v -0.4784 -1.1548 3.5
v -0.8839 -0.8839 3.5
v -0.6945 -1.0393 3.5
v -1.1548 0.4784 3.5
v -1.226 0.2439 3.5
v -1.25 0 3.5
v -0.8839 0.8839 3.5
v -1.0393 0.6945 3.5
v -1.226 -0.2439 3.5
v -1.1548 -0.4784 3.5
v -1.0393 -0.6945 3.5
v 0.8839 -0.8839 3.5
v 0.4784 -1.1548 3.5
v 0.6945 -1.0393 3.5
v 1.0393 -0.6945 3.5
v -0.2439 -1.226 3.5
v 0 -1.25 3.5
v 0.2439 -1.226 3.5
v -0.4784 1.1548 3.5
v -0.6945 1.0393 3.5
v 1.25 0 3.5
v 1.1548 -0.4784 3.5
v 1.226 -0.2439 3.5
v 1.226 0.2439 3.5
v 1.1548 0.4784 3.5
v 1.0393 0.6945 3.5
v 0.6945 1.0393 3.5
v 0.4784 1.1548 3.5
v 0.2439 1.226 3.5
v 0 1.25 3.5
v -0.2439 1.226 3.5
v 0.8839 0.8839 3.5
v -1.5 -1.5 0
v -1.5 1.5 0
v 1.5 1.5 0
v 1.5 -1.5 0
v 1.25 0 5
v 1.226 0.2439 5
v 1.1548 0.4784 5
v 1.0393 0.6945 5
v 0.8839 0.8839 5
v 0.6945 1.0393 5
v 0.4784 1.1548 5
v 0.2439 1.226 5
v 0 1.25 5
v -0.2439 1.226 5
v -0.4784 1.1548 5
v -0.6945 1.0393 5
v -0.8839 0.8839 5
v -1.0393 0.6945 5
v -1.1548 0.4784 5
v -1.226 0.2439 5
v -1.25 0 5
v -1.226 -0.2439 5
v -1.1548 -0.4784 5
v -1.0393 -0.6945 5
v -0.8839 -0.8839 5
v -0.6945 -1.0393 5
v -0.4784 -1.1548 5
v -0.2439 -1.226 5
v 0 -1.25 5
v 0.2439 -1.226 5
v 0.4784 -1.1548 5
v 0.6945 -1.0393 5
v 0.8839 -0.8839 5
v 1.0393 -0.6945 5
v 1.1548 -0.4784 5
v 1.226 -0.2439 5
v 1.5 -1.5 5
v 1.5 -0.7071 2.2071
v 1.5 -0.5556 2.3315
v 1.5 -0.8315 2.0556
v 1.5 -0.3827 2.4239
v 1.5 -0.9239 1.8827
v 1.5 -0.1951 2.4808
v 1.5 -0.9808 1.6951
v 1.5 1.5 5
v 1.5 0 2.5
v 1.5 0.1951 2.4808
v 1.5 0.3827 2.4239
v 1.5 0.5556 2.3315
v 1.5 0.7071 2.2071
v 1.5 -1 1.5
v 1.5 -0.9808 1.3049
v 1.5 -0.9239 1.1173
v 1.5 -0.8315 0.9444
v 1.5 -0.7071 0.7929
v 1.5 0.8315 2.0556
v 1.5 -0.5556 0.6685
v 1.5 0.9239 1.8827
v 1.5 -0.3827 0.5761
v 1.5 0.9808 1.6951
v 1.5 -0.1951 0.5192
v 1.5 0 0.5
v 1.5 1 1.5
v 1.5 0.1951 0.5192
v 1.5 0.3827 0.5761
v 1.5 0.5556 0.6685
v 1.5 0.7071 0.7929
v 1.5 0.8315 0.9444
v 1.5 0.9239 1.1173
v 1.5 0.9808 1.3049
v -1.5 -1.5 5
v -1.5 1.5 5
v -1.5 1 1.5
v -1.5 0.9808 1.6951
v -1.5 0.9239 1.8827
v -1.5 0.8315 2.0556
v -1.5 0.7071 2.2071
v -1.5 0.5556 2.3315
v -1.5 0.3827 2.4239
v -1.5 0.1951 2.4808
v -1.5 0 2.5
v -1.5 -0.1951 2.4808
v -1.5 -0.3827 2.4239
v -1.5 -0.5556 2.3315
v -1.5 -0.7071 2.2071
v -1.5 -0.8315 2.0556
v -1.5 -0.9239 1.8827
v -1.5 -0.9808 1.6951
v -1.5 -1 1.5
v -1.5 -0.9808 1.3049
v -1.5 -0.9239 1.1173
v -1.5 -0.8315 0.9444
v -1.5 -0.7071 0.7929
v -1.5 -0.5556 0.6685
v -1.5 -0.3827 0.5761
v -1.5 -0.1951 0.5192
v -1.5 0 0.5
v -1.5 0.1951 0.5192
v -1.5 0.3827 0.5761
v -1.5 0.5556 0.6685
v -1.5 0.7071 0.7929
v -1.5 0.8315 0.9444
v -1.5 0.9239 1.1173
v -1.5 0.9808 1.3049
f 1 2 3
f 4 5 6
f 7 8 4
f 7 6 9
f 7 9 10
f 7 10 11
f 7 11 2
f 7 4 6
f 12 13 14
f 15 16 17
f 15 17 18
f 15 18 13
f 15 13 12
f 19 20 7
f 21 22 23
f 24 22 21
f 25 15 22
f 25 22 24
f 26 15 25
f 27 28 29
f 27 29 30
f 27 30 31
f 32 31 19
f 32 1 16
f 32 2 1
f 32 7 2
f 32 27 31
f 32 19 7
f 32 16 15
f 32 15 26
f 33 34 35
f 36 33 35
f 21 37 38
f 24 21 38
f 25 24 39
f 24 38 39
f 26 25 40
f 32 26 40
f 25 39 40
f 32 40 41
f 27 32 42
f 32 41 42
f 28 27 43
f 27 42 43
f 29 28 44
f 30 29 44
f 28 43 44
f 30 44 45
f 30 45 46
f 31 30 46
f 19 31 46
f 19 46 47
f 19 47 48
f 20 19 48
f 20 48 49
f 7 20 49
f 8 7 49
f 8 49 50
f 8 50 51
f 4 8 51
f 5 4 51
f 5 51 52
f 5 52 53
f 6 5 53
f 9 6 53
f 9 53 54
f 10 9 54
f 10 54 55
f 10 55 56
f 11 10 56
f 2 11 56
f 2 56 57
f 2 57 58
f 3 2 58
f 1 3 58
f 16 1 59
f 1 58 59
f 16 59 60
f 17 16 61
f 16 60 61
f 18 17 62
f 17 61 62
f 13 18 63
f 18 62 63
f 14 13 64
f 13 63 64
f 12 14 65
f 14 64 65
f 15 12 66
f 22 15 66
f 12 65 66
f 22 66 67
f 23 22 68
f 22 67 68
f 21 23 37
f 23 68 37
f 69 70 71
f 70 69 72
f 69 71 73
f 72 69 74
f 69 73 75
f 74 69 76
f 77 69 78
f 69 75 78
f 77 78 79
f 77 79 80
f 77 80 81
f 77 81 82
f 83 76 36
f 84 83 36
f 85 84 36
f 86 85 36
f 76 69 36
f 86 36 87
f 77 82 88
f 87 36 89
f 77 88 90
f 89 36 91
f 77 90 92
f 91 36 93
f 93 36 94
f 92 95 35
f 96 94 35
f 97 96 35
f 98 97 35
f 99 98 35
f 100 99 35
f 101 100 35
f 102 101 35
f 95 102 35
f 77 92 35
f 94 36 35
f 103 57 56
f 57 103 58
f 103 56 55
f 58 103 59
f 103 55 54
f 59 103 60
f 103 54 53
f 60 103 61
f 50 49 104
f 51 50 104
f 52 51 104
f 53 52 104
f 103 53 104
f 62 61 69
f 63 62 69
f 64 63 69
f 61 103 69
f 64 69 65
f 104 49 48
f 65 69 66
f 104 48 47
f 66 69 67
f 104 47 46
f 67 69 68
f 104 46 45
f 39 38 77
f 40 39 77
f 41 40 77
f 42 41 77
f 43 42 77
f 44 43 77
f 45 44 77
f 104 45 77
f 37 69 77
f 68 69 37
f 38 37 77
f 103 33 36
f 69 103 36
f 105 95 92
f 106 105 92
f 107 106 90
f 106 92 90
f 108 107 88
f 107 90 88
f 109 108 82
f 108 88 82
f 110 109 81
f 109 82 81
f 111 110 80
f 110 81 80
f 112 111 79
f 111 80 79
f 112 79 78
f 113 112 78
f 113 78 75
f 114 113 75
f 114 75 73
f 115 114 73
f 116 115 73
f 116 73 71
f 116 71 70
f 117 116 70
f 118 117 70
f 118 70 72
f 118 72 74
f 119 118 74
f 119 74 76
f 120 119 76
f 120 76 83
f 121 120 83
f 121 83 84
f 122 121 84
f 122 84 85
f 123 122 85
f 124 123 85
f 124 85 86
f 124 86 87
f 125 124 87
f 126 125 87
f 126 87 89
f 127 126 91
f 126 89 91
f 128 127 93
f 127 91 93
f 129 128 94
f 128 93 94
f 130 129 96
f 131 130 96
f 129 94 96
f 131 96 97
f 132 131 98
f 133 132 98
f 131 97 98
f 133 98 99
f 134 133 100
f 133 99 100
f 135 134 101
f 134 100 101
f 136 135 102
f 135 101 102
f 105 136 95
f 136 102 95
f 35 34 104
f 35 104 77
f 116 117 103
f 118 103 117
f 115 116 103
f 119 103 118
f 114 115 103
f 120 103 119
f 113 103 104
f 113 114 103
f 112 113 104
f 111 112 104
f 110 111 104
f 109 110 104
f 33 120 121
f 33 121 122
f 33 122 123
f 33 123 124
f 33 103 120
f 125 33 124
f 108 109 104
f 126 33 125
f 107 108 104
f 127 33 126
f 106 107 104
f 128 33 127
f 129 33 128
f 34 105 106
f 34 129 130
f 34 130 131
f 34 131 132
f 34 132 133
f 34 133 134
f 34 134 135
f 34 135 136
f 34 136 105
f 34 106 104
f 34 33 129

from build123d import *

# Parameters (mm, degrees)
SKETCH1_W           = 3
SKETCH1_H           = 3
BOSS_EXTRUDE2_DEPTH = 6
SKETCH2_R           = 1
CUT_EXTRUDE1_DEPTH  = 6
SKETCH3_R           = 1.25
CUT_EXTRUDE2_DEPTH  = 2.5
SKETCH4_W           = 1
SKETCH4_H           = 3
CUT_EXTRUDE21_DEPTH = 4


with BuildPart() as part:
    # Sketch1 → Boss-Extrude2 (new body)
    with BuildSketch(Plane.XY):
        Rectangle(SKETCH1_W, SKETCH1_H)
    extrude(amount=BOSS_EXTRUDE2_DEPTH)

    # Sketch2 → Cut-Extrude1 (cut)
    with BuildSketch(Plane(origin=(1.5, 0, 0), x_dir=(0, 0, -1), z_dir=(1, 0, 0))):
        with Locations(Location((-1.5, 0, 0), (0, 0, 90))):
            Circle(SKETCH2_R)
    extrude(amount=-CUT_EXTRUDE1_DEPTH, mode=Mode.SUBTRACT)

    # Sketch3 → Cut-Extrude2 (cut)
    with BuildSketch(Plane.XY.offset(6)):
        Circle(SKETCH3_R)
    extrude(amount=-CUT_EXTRUDE2_DEPTH, mode=Mode.SUBTRACT)

    # Sketch4 → Cut-Extrude21 (cut)
    with BuildSketch(Plane(origin=(1.5, 0, 0), x_dir=(0, 0, -1), z_dir=(1, 0, 0))):
        with Locations((-5.5, 0)):
            Rectangle(SKETCH4_W, SKETCH4_H)
    extrude(amount=-CUT_EXTRUDE21_DEPTH, mode=Mode.SUBTRACT)


solid = part.part
